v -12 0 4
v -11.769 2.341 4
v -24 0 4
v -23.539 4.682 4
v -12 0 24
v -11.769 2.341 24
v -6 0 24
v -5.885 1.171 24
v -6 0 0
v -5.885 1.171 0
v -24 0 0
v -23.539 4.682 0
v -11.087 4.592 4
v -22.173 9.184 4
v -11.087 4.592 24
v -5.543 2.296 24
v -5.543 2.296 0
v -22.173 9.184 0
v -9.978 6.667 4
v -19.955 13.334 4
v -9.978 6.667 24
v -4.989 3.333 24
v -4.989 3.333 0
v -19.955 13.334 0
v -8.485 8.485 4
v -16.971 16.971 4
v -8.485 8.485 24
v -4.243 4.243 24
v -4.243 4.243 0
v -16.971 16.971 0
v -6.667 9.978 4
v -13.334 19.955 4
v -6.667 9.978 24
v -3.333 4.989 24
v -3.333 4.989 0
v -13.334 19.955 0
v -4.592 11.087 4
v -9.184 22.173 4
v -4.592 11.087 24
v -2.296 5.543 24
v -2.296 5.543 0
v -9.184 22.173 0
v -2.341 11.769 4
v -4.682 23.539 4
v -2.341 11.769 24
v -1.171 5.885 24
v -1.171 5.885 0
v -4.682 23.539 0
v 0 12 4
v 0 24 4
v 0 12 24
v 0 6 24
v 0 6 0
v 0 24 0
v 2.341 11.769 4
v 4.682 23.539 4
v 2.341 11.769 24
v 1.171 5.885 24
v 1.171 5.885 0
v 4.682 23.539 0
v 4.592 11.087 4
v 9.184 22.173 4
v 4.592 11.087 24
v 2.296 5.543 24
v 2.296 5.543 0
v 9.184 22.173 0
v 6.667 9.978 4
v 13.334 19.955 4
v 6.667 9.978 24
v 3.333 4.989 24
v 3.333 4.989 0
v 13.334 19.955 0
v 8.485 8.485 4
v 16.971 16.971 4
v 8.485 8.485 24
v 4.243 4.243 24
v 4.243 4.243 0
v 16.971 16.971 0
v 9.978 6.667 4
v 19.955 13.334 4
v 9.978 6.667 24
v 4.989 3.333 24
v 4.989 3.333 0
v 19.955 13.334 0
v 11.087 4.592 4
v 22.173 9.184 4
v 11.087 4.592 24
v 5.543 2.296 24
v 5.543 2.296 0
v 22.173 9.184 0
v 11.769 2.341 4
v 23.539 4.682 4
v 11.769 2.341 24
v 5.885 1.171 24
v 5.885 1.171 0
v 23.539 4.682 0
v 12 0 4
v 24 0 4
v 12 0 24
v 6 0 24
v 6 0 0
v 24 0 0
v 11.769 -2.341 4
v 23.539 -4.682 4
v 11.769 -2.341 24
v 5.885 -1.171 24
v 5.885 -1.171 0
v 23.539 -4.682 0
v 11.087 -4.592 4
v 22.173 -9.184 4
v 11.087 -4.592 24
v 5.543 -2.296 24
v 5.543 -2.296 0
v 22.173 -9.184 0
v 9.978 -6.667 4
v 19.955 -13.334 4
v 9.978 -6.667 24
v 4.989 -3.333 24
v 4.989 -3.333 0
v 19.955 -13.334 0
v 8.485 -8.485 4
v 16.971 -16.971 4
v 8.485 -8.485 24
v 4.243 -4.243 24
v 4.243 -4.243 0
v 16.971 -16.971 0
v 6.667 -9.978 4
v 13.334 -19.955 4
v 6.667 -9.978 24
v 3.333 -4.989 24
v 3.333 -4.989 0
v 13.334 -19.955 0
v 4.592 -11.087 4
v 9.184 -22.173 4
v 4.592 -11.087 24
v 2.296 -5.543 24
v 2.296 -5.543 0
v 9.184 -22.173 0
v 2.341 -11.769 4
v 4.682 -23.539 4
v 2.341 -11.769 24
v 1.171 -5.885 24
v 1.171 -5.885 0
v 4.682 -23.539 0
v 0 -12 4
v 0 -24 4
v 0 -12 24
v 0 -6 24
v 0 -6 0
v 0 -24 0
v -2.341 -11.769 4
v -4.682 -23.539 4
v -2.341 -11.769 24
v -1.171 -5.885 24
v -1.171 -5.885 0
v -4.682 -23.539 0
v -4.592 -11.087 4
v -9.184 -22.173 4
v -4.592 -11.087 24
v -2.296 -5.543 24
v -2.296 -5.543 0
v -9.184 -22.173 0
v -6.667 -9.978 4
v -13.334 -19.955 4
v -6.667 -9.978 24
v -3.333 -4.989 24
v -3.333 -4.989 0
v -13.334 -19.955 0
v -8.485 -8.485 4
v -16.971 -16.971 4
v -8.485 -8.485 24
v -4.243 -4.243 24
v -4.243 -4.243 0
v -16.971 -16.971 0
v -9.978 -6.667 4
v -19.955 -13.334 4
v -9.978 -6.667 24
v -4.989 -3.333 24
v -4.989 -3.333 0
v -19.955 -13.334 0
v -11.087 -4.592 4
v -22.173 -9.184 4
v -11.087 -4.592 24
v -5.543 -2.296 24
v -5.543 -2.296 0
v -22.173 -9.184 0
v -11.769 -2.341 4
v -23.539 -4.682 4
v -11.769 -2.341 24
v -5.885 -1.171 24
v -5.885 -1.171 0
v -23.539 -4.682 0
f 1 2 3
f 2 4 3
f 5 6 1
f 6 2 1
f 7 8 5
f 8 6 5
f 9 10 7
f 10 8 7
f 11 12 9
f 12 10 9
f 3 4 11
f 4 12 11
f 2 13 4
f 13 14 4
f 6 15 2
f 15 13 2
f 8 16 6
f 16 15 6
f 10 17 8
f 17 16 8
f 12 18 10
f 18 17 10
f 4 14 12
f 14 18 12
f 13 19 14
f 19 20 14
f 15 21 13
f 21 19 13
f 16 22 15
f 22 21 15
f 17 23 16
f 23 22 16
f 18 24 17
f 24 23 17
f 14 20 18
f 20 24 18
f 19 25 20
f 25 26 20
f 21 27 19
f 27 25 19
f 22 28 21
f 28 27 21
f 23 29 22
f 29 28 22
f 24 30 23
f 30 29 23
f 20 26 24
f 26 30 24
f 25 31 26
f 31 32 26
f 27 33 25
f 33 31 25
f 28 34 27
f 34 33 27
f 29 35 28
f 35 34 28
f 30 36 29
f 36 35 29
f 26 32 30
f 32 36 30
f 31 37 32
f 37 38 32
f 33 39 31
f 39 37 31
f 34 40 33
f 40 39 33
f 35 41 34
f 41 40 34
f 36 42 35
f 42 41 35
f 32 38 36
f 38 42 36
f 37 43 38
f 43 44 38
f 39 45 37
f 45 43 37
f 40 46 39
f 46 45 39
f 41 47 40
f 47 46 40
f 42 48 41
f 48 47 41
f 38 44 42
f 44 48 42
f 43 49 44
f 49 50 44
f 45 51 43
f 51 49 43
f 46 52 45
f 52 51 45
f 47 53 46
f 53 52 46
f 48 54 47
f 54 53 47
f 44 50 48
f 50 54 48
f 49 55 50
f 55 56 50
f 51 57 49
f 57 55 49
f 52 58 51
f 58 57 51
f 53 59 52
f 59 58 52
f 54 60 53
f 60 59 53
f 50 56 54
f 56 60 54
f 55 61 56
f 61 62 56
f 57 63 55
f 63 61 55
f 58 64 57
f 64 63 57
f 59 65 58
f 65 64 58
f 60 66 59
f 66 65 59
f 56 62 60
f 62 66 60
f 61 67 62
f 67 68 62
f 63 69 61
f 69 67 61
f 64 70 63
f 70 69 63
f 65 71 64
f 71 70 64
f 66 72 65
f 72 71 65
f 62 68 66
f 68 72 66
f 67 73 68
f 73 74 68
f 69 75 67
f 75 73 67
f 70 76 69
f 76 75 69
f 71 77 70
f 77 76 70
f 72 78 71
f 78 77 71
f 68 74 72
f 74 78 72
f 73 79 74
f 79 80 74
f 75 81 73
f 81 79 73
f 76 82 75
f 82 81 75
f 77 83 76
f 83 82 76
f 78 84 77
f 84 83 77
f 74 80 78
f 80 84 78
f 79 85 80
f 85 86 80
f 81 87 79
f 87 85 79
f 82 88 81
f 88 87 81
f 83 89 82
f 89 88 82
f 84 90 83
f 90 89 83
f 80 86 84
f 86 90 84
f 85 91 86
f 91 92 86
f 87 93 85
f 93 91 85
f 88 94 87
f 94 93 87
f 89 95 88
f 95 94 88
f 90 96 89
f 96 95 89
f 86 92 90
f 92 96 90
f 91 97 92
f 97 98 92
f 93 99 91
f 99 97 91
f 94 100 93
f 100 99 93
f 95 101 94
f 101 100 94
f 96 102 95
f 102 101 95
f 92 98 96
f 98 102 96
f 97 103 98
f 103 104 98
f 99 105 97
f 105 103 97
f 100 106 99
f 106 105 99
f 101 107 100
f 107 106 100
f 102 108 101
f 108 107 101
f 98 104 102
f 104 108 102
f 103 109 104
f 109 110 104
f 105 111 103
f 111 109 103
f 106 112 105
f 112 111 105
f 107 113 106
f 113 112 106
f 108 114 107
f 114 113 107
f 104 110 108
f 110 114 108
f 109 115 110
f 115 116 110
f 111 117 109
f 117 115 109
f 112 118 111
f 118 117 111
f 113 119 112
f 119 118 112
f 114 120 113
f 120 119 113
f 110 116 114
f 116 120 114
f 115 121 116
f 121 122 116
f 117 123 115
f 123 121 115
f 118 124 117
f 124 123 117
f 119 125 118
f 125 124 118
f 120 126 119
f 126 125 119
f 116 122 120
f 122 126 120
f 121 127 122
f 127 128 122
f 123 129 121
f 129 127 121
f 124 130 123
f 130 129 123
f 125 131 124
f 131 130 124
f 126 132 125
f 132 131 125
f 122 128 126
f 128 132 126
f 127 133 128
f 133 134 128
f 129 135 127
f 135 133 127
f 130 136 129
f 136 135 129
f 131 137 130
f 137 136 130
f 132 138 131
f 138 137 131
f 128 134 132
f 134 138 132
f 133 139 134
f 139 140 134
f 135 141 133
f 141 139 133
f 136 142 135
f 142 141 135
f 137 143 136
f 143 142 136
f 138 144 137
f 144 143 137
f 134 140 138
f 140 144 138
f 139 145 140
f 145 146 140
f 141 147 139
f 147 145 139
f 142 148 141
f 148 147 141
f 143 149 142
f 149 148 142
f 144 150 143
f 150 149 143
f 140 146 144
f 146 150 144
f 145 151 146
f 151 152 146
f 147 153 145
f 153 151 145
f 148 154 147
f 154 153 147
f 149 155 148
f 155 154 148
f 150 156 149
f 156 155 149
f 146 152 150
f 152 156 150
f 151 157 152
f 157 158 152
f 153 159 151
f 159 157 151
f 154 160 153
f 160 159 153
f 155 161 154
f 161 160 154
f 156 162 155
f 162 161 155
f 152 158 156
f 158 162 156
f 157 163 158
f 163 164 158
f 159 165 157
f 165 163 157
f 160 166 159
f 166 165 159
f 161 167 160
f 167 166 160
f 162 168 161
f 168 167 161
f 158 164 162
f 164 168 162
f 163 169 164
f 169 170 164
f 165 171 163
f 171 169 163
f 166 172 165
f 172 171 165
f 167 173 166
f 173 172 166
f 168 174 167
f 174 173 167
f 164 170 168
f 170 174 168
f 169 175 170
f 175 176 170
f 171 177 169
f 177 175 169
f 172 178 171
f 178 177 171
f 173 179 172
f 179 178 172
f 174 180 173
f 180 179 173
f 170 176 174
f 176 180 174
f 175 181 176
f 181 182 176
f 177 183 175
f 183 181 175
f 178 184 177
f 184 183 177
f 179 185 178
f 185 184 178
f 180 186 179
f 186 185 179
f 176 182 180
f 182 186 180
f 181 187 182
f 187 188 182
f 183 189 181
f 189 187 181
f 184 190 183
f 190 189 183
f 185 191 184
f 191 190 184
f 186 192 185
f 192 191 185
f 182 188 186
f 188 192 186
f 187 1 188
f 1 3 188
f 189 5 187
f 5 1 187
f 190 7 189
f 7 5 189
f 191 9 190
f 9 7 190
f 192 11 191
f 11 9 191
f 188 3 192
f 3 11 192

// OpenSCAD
$fn = 32;

// ----------------------------------------------------------------------
// Revolved part: flanged bushing R24
// ----------------------------------------------------------------------

// --- parameters (mm) ---
bore_r = 6;               // bore radius
flange_r = 24;            // flange radius
flange_h = 4;             // flange thickness
sleeve_r = 12;            // sleeve radius
total_h = 24;             // overall height
revolve_angle = 360;      // revolve sweep, degrees
fit_tol = 0.02;           // declared fit tolerance (prompt contract)
free_tol = 0.2;           // declared free tolerance (prompt contract)

bore_d = 2 * bore_r;
flange_d = 2 * flange_r;
sleeve_d = 2 * sleeve_r;

profile = [[6, 0], [24, 0], [24, 4], [12, 4], [12, 24], [6, 24]];  // primary outline, 6 points, counter clockwise

// --- the one profile operation ---
rotate_extrude(angle = revolve_angle) polygon(points = profile);
